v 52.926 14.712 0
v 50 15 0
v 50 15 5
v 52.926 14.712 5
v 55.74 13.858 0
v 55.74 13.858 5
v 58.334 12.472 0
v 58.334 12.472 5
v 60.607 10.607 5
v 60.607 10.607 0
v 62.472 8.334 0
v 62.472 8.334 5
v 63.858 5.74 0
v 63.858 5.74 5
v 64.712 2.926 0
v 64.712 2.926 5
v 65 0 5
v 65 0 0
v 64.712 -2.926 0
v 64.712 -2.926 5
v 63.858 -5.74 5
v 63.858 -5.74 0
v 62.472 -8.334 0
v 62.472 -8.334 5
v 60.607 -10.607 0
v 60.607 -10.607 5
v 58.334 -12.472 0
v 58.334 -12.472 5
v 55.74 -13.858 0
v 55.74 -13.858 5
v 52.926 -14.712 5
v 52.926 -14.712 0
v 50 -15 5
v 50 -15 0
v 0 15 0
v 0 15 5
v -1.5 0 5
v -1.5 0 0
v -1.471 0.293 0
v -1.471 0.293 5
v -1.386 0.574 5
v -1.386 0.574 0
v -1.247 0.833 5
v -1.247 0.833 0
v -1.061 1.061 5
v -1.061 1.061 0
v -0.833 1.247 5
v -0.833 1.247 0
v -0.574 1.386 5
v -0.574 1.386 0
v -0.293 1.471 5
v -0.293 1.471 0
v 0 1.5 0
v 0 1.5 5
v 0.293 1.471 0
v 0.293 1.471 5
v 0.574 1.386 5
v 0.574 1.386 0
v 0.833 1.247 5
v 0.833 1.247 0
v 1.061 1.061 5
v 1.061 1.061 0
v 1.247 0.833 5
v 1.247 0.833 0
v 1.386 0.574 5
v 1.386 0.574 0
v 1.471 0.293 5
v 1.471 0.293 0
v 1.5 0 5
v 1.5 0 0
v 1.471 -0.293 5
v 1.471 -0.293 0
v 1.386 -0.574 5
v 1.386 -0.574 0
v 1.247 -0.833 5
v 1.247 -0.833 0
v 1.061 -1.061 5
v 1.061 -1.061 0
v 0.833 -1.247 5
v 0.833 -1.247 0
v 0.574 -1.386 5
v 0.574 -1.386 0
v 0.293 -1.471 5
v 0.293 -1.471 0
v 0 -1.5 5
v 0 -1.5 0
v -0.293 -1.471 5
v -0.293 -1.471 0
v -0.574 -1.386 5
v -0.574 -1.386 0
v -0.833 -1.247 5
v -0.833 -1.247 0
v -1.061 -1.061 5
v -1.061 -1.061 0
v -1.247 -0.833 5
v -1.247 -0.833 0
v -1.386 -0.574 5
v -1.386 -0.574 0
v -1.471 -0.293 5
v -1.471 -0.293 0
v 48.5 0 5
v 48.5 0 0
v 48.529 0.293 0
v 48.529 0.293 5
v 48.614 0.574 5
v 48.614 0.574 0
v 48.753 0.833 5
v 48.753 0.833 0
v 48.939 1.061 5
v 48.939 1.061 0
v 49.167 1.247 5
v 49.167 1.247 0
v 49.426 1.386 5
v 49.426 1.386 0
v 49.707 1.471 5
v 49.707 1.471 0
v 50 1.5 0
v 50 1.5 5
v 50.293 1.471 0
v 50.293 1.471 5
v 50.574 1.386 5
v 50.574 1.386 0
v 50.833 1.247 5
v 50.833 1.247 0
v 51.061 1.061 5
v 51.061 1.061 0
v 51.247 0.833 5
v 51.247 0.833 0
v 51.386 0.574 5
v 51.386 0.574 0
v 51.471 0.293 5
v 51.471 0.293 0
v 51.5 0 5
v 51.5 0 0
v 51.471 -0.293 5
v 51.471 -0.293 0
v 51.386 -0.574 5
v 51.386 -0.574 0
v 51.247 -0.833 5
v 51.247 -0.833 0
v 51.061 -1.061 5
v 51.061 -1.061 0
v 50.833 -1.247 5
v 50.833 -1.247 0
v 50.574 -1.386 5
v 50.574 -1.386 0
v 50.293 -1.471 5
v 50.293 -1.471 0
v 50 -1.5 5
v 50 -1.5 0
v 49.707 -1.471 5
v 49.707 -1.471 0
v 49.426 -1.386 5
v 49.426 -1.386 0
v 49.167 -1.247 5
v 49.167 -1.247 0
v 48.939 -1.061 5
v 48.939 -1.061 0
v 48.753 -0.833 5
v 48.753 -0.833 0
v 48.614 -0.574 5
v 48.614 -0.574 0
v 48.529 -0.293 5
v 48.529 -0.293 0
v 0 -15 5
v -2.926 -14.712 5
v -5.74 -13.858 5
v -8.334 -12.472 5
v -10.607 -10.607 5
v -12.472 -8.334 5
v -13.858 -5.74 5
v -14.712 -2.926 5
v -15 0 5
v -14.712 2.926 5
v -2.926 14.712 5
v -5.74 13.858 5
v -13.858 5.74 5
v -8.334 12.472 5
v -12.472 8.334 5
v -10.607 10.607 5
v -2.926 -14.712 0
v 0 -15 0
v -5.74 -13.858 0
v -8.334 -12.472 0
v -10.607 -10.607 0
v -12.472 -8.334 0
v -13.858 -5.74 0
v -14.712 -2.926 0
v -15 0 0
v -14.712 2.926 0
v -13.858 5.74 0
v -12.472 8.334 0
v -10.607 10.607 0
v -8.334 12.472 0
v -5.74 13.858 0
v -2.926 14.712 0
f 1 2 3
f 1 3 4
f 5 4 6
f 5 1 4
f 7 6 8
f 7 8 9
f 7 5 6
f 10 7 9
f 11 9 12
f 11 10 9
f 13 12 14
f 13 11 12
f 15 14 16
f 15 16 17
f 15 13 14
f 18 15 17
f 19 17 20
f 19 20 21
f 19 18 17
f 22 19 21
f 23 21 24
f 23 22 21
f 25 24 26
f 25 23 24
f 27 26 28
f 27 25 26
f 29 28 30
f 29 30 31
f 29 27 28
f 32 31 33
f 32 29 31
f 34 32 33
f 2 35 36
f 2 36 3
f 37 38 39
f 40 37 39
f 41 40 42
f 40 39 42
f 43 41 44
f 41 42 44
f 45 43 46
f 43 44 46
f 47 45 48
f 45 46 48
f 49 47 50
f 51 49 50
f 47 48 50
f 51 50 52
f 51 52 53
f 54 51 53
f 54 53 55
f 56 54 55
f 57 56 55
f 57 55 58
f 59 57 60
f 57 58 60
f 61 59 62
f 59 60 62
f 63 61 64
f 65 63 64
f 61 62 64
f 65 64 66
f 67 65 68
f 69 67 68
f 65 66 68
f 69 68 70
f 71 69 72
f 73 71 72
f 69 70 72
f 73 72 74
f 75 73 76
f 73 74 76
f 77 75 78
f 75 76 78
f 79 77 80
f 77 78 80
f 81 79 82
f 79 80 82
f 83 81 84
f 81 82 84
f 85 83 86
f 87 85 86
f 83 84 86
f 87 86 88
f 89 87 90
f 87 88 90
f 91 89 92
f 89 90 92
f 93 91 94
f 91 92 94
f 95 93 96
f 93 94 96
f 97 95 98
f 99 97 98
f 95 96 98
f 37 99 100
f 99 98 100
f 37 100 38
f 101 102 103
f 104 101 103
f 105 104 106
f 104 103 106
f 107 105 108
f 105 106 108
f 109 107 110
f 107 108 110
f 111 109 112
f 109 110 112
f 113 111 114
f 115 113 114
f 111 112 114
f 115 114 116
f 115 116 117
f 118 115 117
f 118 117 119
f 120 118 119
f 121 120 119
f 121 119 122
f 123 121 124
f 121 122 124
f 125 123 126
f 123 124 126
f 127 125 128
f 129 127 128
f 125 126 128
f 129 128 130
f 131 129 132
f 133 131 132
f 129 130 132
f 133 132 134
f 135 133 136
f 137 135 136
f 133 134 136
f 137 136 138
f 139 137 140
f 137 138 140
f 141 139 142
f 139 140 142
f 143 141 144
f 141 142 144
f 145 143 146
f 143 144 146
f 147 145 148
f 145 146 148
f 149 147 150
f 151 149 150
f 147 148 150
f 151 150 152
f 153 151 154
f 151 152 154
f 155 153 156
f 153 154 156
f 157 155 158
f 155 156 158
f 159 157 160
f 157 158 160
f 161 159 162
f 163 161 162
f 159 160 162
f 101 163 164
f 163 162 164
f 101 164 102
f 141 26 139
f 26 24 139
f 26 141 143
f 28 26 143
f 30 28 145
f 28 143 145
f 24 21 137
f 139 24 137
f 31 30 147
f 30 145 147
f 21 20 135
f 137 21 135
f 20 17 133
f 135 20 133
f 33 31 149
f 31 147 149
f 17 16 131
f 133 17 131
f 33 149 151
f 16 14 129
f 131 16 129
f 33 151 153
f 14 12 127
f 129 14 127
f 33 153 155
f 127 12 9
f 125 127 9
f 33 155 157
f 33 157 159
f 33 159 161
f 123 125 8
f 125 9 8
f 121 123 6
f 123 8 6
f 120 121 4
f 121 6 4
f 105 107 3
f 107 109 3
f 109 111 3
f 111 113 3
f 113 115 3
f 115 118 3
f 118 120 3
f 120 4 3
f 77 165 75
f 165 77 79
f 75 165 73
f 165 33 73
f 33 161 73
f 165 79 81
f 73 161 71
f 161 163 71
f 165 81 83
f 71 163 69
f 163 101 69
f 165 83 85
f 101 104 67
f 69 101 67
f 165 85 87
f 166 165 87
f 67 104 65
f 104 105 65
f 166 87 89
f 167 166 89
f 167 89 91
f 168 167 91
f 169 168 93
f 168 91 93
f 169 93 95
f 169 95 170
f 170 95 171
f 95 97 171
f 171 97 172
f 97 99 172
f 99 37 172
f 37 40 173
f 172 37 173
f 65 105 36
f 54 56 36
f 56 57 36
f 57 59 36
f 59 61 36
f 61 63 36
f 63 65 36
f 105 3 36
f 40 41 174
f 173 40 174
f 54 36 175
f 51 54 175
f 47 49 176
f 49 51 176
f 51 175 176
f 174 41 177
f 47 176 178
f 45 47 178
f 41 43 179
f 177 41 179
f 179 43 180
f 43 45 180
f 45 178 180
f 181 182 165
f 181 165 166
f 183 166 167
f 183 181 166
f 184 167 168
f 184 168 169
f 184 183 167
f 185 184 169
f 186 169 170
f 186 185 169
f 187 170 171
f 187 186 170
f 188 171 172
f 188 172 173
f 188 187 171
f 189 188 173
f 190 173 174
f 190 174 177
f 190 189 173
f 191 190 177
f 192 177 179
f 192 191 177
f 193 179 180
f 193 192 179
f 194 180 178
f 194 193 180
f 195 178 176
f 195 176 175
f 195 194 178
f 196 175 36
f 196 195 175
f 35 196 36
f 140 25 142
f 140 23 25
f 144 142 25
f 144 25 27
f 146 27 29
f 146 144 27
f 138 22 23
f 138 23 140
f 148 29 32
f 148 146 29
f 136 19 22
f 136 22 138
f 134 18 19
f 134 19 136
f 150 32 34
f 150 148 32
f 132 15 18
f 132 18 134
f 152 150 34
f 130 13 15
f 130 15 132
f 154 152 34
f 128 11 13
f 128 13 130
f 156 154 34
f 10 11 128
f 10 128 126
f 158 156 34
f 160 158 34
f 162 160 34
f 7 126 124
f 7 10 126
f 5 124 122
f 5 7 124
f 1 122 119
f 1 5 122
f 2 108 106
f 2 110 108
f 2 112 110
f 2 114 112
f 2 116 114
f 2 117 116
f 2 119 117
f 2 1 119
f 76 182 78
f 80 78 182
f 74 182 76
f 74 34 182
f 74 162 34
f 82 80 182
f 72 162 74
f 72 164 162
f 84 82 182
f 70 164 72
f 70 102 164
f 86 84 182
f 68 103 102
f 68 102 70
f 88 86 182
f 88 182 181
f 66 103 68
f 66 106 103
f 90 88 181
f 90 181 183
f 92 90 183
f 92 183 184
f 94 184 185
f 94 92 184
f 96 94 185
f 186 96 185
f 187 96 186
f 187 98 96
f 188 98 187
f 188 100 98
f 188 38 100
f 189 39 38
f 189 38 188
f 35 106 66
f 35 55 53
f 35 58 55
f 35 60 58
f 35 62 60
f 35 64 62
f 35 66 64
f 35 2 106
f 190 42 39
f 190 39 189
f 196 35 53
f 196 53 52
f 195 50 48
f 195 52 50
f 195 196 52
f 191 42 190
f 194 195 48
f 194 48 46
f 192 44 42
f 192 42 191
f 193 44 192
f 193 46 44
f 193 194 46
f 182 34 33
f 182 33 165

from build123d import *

# Parameters (mm, degrees)
BOSS_EXTRUDE1_DEPTH = 5
SKETCH3_R           = 1.5
CUT_EXTRUDE1_DEPTH  = 5


with BuildPart() as part:
    # Sketch2 → Boss-Extrude1 (new body)
    with BuildSketch(Plane.XY):
        with BuildLine():
            Line((0, 15), (50, 15))
            ThreePointArc((50, 15), (65, 0), (50, -15))
            Line((50, -15), (0, -15))
            ThreePointArc((0, -15), (-15, 0), (0, 15))
        make_face()
    extrude(amount=BOSS_EXTRUDE1_DEPTH)

    # Sketch3 → Cut-Extrude1 (cut)
    with BuildSketch(Plane(origin=(0, 0, 0), x_dir=(-1, 0, 0), z_dir=(0, 0, -1))):
        with Locations((-50, 0)):
            Circle(SKETCH3_R)
        Circle(SKETCH3_R)
    extrude(amount=-CUT_EXTRUDE1_DEPTH, mode=Mode.SUBTRACT)


solid = part.part
